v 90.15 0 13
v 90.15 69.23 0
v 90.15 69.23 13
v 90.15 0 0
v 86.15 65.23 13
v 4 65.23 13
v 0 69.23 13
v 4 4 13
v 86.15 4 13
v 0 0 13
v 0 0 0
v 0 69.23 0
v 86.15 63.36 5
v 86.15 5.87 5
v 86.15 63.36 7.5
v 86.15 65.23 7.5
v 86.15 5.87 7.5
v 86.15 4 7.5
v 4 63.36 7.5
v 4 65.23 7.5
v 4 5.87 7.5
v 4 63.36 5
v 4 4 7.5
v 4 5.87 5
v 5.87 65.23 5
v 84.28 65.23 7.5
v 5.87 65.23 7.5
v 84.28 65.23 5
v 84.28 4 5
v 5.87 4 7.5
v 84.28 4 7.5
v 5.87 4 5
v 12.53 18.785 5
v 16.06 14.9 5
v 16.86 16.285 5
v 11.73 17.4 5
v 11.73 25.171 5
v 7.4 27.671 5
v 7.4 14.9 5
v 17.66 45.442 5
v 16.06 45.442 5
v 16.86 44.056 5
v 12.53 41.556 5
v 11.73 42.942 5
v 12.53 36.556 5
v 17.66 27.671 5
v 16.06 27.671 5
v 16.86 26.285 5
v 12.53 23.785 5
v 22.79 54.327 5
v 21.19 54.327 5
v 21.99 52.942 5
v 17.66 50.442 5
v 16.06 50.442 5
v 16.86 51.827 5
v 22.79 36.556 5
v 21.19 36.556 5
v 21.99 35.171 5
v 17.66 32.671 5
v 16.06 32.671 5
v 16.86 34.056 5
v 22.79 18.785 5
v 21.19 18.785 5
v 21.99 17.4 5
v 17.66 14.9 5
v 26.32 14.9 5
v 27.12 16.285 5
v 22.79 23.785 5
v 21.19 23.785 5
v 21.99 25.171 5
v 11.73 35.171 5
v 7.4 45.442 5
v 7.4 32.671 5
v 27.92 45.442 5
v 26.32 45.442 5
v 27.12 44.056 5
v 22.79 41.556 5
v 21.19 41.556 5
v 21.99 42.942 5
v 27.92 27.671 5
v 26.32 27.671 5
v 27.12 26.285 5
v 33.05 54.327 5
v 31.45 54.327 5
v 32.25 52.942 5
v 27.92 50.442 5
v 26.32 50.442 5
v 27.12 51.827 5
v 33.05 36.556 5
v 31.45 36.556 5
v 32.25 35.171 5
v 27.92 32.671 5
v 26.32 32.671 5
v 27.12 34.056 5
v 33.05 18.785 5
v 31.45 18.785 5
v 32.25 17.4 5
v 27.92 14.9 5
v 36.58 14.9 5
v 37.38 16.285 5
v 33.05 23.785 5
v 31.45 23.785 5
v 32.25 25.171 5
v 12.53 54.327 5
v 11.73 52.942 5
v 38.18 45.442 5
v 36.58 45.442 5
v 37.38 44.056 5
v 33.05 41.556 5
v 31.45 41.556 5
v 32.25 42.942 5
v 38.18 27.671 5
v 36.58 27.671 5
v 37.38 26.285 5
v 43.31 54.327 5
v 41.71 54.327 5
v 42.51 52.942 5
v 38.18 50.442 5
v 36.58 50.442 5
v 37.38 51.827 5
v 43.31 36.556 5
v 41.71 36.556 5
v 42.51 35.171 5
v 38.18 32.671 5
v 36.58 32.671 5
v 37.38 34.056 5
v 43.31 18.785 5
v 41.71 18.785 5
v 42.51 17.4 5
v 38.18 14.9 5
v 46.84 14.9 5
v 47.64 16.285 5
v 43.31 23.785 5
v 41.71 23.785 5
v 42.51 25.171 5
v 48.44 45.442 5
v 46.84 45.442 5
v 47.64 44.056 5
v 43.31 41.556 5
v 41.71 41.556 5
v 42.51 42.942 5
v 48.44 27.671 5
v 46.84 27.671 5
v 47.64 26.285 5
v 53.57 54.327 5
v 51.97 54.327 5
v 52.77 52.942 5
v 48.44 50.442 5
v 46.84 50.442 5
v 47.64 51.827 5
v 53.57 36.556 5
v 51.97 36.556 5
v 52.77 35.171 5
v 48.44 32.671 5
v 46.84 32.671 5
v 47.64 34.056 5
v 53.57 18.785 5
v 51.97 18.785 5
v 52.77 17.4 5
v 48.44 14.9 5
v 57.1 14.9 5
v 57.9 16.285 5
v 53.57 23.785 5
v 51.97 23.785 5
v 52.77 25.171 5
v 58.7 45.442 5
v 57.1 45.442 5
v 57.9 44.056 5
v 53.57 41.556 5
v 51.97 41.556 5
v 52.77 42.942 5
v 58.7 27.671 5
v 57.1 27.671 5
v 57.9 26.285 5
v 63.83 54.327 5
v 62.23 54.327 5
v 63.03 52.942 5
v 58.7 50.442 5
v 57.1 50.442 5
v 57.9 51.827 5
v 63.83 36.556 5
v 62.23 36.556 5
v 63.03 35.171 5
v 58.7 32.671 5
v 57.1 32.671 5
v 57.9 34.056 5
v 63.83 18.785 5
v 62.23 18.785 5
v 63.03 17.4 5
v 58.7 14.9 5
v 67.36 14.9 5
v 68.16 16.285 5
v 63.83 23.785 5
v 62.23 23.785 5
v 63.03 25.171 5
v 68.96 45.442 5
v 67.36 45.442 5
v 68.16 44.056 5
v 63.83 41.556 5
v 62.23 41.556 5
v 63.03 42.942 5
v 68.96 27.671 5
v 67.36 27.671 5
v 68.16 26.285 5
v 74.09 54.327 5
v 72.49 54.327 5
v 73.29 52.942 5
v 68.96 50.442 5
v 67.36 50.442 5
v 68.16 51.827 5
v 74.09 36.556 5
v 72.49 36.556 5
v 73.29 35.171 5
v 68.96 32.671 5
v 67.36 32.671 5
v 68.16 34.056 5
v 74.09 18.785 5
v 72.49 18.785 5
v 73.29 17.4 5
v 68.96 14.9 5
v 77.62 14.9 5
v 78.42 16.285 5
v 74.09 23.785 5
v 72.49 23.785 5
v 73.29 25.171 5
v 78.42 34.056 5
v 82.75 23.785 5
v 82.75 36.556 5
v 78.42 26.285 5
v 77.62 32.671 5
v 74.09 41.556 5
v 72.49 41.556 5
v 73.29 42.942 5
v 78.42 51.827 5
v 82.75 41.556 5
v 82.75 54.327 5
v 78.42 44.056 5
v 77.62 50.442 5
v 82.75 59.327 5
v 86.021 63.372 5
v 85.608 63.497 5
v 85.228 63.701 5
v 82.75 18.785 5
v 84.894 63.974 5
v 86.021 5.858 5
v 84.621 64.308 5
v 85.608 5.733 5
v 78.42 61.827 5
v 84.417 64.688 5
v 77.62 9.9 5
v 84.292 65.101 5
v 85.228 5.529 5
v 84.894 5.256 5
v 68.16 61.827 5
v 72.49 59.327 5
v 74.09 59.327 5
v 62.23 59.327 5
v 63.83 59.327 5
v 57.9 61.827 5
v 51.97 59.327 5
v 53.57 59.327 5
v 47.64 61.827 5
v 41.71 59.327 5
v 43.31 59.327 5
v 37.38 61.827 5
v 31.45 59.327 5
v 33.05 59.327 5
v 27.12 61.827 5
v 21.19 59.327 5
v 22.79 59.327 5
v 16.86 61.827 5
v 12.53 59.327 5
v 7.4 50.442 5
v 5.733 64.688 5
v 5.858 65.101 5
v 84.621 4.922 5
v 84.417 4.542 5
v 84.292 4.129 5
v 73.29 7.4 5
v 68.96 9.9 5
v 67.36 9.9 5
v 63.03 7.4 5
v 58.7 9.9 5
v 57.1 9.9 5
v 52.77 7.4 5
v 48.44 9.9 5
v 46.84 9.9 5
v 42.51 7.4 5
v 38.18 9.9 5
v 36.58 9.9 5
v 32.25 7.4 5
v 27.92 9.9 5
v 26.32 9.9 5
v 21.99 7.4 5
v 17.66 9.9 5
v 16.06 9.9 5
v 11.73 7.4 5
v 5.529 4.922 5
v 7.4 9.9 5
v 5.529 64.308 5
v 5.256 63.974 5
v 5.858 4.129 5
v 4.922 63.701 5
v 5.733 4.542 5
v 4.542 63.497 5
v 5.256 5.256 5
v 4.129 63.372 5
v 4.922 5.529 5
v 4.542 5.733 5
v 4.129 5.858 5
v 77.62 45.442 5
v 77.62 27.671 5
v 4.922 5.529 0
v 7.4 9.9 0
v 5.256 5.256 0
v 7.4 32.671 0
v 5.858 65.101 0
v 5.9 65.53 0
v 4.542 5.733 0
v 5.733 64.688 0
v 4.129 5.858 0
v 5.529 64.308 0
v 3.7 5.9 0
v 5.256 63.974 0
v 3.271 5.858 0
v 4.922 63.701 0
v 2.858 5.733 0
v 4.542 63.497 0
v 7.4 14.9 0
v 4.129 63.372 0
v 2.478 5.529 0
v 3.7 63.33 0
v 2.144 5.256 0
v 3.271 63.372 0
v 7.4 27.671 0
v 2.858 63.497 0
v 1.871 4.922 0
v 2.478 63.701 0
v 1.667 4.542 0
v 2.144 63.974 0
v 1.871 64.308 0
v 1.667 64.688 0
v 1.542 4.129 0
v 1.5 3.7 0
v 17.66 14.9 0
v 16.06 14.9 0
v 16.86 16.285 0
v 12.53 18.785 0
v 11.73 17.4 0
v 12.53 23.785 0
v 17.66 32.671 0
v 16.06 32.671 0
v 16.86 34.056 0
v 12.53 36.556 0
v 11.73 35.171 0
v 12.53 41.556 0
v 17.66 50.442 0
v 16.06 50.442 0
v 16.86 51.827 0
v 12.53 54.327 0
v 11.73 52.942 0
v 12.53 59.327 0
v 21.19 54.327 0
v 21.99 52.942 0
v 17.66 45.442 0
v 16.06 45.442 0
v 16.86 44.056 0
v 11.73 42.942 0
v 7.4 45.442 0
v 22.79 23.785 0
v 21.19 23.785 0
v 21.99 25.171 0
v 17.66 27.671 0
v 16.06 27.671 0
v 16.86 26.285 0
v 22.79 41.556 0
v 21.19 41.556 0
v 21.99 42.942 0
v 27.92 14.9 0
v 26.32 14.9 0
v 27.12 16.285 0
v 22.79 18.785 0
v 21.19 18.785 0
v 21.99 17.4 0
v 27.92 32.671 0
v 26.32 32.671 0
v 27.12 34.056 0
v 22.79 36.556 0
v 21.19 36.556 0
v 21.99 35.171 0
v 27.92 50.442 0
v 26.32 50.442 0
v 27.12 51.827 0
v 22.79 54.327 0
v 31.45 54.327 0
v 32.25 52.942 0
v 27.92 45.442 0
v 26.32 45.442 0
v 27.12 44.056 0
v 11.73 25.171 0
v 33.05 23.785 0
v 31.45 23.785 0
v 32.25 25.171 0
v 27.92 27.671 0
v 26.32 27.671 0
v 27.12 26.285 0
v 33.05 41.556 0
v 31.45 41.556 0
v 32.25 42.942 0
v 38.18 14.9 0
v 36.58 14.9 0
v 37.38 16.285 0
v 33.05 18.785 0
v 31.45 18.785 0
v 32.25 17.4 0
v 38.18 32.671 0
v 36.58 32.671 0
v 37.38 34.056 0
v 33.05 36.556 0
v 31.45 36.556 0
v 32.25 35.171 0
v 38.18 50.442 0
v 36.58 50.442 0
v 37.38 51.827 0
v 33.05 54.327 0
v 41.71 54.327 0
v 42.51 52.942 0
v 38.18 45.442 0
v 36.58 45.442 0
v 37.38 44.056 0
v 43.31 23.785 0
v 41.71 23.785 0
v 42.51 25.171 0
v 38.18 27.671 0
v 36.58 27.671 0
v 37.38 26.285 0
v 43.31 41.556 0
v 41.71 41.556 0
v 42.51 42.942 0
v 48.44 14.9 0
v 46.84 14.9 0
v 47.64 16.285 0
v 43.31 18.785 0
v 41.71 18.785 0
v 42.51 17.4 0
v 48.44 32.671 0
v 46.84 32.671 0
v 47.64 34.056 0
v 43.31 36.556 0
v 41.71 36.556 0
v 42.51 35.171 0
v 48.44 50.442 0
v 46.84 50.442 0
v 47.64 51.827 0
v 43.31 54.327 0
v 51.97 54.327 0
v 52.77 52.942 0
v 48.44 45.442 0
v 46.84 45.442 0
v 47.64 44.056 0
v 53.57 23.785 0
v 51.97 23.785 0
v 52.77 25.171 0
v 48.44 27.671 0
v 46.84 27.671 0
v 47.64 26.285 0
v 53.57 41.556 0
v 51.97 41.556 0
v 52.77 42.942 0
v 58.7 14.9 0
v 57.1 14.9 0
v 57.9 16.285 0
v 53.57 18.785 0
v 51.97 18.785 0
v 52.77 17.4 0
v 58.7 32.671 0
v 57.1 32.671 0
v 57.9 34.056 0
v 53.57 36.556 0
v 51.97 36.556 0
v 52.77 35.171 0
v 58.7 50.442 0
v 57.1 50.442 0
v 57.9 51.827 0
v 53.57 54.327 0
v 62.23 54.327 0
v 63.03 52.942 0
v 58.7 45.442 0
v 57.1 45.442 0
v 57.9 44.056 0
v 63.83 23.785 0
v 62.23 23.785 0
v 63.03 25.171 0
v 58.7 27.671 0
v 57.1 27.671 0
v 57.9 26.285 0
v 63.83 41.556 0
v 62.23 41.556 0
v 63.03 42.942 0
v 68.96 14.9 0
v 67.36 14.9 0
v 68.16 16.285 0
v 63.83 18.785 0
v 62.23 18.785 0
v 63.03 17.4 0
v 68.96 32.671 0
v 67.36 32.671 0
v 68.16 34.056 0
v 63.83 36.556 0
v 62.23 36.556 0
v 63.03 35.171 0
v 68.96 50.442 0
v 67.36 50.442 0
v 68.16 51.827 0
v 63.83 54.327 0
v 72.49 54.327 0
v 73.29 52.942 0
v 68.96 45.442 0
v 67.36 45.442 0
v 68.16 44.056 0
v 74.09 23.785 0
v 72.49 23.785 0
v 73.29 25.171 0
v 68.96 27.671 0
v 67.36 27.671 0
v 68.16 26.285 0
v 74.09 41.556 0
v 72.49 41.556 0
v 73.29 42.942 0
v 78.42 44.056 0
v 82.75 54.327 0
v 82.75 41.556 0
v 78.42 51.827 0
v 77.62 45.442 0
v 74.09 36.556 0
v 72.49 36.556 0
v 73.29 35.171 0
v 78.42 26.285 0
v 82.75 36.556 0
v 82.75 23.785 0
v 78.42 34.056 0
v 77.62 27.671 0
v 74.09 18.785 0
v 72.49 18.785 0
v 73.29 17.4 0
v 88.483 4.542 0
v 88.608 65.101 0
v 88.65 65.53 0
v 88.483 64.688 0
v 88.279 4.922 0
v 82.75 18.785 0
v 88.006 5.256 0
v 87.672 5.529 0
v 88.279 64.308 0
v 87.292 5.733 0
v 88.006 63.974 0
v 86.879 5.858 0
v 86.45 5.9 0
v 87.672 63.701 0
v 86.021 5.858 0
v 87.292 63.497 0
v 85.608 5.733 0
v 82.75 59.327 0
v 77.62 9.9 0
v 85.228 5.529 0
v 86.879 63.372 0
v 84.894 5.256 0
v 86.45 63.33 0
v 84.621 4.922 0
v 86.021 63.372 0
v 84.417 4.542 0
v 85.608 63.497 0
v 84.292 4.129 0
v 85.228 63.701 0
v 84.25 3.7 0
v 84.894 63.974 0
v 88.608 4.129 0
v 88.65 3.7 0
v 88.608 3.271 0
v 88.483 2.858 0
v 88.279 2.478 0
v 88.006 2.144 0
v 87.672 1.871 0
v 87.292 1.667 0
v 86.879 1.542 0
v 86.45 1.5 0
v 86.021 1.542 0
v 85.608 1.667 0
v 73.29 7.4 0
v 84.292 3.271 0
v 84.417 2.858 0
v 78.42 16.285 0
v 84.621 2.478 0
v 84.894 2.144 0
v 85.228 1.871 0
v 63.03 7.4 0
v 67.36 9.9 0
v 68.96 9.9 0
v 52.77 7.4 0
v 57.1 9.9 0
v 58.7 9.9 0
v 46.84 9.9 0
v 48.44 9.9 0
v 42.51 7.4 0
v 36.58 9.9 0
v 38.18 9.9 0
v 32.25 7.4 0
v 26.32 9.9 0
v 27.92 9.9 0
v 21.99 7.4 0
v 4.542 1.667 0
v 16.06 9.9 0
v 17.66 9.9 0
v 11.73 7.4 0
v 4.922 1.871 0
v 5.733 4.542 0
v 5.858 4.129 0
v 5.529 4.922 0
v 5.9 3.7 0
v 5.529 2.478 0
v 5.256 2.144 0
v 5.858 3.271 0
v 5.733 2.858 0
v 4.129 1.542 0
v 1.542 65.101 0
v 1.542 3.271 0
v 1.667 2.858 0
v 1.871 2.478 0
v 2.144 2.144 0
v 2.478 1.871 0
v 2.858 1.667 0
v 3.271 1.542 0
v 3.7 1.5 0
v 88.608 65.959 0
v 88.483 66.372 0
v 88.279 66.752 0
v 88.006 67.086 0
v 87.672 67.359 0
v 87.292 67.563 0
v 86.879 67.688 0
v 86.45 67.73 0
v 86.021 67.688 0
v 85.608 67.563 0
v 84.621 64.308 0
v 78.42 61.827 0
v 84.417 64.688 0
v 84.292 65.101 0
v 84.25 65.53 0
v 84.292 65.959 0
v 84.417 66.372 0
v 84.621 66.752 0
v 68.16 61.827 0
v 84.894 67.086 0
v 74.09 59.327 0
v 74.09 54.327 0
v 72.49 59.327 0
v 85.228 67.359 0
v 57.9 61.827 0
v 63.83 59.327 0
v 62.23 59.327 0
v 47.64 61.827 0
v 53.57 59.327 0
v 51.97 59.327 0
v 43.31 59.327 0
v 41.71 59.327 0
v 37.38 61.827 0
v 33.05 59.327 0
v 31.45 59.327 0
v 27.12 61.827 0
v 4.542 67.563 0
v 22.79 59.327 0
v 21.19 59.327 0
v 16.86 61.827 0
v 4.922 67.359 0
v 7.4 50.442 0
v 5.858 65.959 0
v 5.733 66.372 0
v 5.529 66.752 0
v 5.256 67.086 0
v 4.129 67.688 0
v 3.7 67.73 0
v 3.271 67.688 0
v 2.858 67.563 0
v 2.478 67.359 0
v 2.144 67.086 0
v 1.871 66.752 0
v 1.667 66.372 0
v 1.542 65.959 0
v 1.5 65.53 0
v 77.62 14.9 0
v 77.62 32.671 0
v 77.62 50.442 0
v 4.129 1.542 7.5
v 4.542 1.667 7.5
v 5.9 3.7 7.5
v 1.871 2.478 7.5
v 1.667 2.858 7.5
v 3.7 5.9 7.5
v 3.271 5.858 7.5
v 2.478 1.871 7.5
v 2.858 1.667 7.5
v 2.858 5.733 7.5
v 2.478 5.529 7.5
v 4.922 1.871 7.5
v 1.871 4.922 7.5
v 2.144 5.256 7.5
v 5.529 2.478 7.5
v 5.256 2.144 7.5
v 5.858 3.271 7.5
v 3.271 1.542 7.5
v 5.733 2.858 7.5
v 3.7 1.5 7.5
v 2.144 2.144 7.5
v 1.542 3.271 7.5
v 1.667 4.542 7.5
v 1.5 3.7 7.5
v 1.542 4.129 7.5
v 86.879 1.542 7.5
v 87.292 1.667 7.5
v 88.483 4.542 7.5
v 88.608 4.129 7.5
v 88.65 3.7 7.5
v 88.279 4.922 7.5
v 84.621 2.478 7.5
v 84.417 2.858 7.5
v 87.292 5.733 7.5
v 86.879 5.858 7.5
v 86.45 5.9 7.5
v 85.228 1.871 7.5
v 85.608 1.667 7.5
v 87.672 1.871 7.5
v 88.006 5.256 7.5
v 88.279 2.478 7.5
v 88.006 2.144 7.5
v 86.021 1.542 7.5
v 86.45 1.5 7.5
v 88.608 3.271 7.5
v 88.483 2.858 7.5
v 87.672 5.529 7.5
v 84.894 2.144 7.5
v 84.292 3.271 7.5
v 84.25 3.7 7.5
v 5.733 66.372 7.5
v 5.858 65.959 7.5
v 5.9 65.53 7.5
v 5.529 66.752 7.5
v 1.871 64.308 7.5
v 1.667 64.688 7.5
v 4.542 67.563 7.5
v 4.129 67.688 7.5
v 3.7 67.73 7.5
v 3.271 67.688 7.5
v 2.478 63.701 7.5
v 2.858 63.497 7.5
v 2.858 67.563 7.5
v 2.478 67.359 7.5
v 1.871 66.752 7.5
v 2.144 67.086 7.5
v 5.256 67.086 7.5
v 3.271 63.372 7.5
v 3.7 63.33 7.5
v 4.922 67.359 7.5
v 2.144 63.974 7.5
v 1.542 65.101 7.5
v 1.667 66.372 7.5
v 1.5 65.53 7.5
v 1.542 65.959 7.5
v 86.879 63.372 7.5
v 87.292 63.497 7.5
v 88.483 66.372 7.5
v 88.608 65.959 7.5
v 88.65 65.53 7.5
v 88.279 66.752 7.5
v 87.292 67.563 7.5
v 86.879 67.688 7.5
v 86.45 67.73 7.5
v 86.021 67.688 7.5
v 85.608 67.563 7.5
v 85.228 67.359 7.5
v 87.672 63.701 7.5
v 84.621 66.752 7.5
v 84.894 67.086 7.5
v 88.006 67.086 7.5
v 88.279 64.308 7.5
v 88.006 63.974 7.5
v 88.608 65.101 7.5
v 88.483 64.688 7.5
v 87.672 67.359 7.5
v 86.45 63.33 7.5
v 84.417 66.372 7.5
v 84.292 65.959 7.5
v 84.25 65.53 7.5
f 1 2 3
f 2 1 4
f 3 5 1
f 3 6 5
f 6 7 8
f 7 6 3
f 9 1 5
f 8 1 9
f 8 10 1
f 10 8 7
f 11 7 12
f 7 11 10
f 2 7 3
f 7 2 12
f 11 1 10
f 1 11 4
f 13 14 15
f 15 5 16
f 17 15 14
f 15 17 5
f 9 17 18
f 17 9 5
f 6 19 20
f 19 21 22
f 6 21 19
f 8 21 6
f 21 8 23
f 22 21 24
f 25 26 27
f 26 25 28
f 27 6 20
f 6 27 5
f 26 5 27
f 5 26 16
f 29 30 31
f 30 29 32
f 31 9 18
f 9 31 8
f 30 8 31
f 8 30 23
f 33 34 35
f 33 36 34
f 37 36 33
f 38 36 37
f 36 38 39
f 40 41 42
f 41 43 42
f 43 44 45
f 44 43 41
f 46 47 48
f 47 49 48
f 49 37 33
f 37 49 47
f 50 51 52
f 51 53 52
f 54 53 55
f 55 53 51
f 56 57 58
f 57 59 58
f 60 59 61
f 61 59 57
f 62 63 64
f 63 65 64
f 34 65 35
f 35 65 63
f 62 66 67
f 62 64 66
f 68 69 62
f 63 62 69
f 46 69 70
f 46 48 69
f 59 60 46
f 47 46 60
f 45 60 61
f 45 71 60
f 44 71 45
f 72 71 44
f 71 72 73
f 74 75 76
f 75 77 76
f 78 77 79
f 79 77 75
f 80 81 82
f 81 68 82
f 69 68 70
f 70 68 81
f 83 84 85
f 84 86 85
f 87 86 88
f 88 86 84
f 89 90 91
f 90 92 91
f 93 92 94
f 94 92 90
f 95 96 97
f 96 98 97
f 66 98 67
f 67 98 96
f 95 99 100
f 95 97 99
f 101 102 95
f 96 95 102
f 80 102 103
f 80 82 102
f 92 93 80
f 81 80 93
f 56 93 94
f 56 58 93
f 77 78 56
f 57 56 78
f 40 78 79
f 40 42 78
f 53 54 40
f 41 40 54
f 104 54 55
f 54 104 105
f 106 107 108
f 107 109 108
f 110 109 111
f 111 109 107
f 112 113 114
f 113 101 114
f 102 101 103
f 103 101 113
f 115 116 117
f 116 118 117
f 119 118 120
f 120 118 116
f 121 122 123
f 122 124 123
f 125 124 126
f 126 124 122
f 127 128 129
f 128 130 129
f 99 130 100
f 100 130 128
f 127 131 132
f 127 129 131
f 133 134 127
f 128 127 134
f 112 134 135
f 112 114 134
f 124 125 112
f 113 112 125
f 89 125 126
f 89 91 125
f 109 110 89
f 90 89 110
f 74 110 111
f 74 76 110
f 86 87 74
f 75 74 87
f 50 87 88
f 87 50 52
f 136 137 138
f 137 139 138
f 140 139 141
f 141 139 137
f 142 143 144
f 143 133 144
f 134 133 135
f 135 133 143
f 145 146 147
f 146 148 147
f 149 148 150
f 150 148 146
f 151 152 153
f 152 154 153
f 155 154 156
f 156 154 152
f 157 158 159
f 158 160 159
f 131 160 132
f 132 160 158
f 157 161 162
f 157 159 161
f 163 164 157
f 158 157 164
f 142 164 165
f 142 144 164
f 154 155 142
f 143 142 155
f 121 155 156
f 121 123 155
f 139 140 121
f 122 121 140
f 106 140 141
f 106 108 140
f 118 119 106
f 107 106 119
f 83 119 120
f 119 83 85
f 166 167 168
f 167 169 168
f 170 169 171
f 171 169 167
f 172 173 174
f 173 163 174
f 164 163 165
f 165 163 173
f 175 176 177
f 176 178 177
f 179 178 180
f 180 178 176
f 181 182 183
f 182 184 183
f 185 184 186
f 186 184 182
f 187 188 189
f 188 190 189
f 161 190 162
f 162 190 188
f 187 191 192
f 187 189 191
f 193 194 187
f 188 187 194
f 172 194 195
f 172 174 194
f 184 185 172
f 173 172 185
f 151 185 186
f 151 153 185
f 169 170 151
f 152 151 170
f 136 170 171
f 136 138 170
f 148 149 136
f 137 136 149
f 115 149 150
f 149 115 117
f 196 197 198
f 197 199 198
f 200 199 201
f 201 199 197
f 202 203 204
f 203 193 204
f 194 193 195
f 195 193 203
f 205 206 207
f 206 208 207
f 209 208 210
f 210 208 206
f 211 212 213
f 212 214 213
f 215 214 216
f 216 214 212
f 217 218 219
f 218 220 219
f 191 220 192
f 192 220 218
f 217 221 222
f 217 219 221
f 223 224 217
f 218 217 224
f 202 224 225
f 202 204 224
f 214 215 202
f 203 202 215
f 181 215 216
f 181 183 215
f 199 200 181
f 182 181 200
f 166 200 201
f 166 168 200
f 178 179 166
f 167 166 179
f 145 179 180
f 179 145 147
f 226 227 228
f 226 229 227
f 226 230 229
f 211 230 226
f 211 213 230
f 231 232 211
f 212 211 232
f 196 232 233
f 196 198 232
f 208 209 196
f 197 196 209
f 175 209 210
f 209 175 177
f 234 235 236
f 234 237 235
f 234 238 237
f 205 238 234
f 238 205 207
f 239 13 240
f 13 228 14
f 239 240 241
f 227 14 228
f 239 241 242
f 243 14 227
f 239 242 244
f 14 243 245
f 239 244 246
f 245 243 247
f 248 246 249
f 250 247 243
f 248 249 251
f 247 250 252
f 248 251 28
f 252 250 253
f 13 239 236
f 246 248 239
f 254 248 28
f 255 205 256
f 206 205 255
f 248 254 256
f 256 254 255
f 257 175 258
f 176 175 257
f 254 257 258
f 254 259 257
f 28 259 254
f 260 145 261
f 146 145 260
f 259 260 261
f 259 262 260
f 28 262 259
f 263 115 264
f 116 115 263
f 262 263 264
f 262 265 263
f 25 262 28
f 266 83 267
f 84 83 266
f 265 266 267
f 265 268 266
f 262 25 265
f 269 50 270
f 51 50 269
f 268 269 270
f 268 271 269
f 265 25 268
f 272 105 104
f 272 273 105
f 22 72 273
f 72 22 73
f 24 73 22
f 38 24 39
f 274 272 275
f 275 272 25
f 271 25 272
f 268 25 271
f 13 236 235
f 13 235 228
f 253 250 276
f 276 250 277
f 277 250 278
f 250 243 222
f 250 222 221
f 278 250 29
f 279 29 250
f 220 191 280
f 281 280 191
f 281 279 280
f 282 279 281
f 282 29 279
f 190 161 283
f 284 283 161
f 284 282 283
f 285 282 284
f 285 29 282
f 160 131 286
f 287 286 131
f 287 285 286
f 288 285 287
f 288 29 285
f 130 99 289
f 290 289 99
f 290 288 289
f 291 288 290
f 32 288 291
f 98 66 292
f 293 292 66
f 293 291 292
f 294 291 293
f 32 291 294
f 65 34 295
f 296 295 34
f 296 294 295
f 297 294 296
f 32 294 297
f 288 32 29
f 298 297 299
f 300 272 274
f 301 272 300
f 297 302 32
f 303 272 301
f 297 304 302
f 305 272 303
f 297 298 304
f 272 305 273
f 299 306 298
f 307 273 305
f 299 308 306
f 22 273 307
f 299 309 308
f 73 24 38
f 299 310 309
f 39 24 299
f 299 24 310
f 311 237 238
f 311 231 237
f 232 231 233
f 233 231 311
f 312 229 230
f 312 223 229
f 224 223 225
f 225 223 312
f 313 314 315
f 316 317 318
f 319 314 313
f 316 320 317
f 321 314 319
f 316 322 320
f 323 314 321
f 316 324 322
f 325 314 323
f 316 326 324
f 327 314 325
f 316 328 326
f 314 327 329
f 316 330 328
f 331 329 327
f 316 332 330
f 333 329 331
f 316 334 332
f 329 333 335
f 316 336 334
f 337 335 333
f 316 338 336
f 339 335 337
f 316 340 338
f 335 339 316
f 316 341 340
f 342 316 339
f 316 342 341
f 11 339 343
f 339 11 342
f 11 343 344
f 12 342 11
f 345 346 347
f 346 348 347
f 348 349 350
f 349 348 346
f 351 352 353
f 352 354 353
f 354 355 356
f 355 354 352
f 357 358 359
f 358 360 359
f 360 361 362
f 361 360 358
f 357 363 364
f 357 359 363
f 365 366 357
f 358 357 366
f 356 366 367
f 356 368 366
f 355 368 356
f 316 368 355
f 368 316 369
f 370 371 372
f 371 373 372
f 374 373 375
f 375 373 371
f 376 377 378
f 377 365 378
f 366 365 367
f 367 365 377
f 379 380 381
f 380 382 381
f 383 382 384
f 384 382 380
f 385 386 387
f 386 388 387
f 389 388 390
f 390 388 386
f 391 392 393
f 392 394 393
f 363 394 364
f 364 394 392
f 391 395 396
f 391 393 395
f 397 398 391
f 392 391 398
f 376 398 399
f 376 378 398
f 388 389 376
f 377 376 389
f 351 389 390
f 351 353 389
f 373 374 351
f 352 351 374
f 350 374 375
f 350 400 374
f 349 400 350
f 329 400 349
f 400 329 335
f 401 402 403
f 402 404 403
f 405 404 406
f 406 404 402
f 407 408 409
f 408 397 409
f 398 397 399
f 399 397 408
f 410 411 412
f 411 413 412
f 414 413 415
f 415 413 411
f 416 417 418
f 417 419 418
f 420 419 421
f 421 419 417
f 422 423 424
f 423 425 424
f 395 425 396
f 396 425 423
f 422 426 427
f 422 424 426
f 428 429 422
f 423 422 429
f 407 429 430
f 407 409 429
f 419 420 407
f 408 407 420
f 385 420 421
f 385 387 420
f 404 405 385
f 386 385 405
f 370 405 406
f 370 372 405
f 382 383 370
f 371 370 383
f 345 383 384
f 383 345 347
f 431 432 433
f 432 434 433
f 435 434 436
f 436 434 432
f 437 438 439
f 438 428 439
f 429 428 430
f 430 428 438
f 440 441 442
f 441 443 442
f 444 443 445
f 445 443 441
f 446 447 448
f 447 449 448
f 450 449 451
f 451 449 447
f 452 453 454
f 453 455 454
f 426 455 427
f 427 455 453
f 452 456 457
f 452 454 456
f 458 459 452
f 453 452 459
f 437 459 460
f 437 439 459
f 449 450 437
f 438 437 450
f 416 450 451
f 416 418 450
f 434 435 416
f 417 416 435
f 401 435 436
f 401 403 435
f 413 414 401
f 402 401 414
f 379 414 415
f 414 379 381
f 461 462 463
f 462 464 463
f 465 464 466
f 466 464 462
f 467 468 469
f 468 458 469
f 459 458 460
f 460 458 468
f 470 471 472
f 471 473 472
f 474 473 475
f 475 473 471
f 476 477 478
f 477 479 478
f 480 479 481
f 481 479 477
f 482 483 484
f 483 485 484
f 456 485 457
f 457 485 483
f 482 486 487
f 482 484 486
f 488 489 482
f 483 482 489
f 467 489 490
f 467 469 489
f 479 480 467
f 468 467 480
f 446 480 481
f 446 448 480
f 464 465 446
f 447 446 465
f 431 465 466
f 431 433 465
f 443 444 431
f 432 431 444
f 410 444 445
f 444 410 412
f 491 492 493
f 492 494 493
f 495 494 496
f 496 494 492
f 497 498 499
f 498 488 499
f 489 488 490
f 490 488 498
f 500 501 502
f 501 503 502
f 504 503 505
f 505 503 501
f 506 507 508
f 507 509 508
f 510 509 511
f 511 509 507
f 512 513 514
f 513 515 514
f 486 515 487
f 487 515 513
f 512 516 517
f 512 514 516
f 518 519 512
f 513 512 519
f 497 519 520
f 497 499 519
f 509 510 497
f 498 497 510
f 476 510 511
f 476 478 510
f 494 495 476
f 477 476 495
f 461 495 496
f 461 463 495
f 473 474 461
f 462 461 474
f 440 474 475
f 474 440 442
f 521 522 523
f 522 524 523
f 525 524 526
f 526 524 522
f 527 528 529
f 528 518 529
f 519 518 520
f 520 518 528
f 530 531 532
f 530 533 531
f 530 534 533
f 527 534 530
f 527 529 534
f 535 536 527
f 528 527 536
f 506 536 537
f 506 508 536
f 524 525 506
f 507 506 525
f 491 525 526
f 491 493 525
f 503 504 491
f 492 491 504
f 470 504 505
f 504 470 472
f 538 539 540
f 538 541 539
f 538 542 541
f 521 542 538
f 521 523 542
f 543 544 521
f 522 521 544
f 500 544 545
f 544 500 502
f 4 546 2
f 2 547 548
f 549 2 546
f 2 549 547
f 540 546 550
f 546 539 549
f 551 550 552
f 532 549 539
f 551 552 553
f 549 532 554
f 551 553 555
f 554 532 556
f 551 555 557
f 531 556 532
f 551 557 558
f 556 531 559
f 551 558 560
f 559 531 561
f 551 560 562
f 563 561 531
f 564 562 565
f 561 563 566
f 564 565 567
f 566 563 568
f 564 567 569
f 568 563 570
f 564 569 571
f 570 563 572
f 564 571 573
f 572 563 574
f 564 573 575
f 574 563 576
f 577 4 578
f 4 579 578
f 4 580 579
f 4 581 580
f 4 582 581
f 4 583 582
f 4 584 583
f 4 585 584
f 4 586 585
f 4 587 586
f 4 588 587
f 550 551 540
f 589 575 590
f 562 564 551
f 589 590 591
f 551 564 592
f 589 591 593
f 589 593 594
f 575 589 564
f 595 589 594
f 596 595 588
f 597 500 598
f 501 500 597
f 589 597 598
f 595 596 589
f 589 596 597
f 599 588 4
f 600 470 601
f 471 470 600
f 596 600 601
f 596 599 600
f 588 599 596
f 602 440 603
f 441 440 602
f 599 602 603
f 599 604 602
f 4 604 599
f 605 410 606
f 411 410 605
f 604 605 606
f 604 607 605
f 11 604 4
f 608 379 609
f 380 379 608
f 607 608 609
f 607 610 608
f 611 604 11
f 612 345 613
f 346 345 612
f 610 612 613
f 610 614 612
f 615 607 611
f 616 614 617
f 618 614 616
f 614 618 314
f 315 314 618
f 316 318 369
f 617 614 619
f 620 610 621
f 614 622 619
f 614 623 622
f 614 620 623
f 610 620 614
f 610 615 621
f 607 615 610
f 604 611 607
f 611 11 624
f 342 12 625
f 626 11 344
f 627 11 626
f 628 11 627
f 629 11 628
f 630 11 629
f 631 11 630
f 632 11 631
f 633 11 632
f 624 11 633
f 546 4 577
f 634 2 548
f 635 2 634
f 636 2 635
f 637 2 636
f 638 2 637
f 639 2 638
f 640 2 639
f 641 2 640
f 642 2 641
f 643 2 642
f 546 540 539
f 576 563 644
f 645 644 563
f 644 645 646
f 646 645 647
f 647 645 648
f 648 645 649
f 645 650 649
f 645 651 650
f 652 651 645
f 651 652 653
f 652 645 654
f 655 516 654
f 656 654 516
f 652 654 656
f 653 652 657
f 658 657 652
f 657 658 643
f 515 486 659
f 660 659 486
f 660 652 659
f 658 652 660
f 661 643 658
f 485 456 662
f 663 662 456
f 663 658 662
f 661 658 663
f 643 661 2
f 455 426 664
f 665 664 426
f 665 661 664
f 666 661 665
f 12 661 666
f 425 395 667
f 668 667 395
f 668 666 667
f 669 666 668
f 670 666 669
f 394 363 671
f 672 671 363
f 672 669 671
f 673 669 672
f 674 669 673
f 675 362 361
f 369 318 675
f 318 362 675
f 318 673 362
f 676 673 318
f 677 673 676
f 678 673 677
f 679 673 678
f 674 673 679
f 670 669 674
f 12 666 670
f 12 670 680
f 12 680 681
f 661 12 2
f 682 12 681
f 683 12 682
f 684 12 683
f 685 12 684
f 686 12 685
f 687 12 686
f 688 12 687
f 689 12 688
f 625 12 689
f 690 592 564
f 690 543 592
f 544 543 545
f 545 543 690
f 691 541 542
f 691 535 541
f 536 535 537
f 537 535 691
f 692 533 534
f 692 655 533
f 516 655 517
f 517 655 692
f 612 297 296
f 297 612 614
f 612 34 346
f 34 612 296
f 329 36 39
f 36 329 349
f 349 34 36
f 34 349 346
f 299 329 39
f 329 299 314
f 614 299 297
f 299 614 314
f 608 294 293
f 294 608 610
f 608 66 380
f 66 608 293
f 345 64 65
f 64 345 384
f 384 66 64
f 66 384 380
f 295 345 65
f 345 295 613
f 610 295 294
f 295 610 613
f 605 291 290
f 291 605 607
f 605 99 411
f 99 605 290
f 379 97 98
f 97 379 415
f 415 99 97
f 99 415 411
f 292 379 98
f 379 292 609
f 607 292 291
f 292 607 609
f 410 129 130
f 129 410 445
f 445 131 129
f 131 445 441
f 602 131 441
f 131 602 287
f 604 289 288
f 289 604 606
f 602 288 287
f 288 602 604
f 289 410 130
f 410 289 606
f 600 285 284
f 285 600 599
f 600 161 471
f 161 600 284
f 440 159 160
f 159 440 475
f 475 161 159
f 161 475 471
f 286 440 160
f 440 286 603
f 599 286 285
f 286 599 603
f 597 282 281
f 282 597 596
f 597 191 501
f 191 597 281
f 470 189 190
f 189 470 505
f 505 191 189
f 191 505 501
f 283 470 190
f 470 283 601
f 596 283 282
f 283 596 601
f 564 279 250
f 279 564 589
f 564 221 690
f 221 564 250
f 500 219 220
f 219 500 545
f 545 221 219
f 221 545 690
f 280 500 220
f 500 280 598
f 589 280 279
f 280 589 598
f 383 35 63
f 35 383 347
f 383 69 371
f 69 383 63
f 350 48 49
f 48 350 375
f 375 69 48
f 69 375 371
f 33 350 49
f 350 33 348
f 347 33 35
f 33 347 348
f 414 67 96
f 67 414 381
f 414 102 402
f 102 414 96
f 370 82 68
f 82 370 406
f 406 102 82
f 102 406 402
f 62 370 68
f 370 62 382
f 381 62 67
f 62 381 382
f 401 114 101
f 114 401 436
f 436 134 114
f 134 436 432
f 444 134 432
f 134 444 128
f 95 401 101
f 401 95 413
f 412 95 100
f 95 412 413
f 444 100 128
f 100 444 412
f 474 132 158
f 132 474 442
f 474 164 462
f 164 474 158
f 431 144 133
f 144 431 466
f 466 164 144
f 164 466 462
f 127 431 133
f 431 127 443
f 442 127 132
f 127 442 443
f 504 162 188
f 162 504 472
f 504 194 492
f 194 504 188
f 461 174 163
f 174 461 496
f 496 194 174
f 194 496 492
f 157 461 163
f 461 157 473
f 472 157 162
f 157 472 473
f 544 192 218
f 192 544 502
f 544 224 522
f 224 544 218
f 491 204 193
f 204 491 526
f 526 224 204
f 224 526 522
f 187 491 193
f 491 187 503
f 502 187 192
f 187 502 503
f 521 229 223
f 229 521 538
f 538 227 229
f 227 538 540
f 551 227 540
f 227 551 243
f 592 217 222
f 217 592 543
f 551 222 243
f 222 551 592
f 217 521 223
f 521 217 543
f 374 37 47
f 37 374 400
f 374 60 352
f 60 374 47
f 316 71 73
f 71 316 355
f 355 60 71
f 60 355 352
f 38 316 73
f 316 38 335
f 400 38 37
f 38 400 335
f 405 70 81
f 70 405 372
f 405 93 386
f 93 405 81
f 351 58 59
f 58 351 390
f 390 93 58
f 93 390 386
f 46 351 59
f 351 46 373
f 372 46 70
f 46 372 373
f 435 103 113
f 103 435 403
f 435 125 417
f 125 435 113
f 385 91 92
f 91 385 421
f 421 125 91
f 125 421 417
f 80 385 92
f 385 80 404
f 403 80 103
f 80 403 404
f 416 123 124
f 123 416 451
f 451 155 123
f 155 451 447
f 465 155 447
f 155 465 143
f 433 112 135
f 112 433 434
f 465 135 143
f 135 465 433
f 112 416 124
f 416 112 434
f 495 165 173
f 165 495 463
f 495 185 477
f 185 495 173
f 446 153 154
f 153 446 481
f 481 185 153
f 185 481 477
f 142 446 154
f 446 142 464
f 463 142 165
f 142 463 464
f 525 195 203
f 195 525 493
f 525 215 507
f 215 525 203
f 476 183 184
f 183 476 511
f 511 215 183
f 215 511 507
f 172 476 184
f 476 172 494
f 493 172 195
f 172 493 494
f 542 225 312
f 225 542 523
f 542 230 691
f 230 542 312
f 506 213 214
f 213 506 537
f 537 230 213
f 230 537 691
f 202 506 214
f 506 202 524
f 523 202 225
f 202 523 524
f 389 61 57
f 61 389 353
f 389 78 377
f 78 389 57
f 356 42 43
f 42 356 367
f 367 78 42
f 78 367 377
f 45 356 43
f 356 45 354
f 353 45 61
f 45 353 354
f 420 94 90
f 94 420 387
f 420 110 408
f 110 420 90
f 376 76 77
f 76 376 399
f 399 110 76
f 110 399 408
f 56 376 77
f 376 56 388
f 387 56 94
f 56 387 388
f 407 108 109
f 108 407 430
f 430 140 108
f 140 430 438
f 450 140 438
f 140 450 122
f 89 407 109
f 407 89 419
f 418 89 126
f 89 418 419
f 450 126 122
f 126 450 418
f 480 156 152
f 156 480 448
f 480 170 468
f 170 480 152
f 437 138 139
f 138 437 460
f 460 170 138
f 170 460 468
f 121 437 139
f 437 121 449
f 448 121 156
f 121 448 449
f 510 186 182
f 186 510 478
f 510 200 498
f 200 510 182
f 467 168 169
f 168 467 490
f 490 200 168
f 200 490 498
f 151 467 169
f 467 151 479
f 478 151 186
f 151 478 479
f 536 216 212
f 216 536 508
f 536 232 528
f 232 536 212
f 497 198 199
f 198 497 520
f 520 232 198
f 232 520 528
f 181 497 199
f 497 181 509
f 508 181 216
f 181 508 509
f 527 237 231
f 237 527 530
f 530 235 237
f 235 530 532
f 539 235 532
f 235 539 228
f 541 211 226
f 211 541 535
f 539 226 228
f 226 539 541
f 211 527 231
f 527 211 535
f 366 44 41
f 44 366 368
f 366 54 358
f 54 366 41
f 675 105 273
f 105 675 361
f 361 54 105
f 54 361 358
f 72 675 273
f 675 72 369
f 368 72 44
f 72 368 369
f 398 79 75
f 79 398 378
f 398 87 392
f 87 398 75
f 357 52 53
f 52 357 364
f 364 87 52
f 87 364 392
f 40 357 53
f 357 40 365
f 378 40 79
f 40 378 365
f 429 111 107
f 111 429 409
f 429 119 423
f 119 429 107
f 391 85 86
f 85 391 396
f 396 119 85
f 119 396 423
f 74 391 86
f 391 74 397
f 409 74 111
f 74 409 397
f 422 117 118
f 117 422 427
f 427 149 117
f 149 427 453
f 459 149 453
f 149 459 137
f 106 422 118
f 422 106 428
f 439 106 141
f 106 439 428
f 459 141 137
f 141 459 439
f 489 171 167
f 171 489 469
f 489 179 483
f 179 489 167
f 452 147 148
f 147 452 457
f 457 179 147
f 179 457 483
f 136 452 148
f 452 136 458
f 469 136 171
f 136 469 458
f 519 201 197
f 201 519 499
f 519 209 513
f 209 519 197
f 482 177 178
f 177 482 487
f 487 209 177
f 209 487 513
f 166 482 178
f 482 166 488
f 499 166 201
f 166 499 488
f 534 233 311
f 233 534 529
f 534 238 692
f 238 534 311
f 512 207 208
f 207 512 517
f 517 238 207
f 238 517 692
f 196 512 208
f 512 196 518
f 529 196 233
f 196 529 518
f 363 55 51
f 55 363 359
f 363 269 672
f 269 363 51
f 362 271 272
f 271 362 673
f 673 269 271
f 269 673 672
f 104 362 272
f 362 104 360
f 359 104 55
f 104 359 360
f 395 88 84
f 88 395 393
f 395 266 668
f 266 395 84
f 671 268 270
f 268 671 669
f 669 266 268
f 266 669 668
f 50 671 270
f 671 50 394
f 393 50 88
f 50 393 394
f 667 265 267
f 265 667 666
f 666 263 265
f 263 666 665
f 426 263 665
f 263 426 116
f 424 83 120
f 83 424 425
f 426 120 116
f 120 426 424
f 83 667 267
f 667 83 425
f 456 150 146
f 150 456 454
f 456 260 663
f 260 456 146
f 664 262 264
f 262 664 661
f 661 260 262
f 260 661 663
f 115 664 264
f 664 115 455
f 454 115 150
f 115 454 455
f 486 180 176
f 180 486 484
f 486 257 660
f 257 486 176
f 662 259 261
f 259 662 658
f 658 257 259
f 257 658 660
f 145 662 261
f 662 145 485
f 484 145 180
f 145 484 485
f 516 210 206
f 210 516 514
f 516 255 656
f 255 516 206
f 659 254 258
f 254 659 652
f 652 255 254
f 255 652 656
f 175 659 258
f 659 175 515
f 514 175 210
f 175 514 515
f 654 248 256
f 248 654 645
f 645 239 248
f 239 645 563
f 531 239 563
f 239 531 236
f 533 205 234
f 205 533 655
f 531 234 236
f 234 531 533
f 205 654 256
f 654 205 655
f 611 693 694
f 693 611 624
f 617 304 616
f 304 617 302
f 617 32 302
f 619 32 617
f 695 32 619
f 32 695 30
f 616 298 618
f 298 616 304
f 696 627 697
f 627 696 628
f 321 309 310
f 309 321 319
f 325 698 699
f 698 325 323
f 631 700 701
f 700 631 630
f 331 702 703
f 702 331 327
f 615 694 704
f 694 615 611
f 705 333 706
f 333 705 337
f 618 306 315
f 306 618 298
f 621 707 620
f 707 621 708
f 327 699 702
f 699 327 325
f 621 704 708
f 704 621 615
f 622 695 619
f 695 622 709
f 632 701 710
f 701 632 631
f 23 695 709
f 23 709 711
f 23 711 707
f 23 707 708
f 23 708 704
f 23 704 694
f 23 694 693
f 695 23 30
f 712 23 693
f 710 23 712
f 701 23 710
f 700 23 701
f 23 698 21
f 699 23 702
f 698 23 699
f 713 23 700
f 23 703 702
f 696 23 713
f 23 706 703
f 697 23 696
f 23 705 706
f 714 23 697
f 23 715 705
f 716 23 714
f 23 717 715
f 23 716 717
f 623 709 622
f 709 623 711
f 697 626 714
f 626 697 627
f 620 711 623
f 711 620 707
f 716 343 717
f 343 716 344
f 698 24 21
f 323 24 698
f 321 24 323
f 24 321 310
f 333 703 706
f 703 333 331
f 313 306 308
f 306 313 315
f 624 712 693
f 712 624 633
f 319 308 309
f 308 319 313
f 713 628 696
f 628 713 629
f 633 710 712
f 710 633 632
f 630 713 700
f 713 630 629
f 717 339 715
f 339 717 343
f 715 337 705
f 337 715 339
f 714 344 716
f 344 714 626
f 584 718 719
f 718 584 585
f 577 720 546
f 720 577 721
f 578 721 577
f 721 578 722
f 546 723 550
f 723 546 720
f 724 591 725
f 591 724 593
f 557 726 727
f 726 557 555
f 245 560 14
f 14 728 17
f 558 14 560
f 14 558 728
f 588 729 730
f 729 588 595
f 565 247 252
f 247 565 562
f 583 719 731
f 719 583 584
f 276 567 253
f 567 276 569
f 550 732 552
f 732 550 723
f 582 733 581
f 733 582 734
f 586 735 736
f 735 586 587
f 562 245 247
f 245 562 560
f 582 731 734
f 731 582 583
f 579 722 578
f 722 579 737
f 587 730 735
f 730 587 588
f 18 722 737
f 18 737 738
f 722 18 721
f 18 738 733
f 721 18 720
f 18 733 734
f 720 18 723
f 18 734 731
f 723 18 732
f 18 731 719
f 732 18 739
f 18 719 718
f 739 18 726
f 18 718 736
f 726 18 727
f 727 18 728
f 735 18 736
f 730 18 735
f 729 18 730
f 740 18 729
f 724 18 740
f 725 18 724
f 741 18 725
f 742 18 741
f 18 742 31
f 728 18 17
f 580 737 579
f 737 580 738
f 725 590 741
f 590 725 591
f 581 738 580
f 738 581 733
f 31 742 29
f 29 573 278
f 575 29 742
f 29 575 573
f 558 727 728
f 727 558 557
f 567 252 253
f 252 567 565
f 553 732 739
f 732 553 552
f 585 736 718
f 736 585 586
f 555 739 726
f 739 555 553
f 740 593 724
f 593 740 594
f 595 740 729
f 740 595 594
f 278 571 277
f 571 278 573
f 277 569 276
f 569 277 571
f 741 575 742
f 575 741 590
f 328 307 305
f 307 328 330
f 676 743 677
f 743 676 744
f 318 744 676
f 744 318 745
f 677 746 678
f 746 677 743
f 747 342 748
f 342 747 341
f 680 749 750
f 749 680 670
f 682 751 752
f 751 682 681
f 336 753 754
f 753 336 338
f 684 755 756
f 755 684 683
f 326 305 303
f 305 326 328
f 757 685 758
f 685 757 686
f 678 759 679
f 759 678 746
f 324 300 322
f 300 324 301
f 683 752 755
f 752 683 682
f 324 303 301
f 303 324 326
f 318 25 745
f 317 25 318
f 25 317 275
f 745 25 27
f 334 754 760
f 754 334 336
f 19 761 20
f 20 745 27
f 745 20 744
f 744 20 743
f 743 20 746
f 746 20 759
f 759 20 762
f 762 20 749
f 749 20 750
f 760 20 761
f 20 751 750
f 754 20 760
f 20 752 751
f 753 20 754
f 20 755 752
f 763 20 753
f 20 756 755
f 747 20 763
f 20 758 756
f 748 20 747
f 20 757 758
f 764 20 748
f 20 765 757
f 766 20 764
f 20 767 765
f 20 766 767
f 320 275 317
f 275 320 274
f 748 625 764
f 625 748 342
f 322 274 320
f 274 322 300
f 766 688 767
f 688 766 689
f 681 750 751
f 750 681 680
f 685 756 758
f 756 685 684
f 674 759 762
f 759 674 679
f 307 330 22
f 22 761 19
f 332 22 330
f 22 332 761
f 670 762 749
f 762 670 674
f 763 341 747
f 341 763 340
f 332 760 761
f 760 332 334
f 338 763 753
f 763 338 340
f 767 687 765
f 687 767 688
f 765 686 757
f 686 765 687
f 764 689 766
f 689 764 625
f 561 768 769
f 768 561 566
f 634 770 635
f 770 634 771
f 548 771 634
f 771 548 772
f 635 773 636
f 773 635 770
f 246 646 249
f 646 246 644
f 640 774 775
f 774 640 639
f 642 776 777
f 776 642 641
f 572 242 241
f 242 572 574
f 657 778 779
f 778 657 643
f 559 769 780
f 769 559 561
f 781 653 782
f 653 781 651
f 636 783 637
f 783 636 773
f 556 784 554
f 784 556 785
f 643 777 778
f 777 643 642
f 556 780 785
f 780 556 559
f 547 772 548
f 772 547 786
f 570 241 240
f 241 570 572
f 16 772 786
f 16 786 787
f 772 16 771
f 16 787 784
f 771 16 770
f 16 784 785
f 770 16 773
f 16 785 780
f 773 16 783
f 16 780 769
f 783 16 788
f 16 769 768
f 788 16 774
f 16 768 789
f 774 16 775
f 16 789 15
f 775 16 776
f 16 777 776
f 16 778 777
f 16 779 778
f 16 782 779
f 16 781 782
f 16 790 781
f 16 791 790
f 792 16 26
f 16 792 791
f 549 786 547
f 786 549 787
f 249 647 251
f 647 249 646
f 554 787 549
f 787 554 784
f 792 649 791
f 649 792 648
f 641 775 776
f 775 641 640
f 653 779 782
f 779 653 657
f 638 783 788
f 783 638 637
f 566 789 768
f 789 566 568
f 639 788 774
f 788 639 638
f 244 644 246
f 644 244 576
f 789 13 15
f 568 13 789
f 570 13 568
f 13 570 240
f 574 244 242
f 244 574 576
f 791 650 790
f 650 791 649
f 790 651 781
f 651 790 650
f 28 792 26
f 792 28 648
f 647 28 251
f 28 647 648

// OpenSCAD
$fn = 32;

// ----------------------------------------------------------------------
// Honeycomb panel: 90.15 x 69.23 mm, 42 cells of 10 mm
// ----------------------------------------------------------------------

// --- parameters (mm) ---
panel_w = 90.15;          // panel width
panel_d = 69.23;          // panel depth
thick = 5;                // panel thickness
cell_r = 5;               // hex cell circumradius
pitch = 10.26;            // hex cell pitch (centre to centre)
web = 1.6;                // web between the cells
columns = 7;              // columns of cells
rows = 6;                 // rows of cells
cell_count = 42;          // total cells
shift_x = 11.73;          // first cell offset in x
shift_y = 12.4;           // first cell offset in y
mount_d = 4.4;            // corner mounting holes
hole_off = 3.7;           // mounting hole offset from the corners
rim_h = 13;               // rim height
rim_t = 4;                // rim wall thickness

difference() {
  union() {
    cube([panel_w, panel_d, thick]);
    /* rim around the panel, sunk 1 mm into the plate */
    translate([0, 0, thick - 1]) difference() {
      cube([panel_w, panel_d, rim_h - thick + 1]);
      translate([rim_t, rim_t, -2.5]) cube([panel_w - 2 * rim_t, panel_d - 2 * rim_t, rim_h - thick + 6]);
    }
  }
  /* hexagonal cells, point-up, cut right through the plate */
  for (row = [0 : rows - 1]) {
    for (col = [0 : columns - 1]) {
      translate([shift_x + col * pitch + (row % 2) * pitch / 2, shift_y + row * pitch * 0.866025, -2.5]) rotate([0, 0, 30]) cylinder(h = thick + 5, d = 2 * cell_r, $fn = 6);
    }
  }
  /* corner mounting holes, clear of the outer cell web */
  translate([3.7, 3.7, -2.5]) cylinder(h = thick + 5, d = mount_d);
  translate([86.45, 3.7, -2.5]) cylinder(h = thick + 5, d = mount_d);
  translate([3.7, 65.53, -2.5]) cylinder(h = thick + 5, d = mount_d);
  translate([86.45, 65.53, -2.5]) cylinder(h = thick + 5, d = mount_d);
}
